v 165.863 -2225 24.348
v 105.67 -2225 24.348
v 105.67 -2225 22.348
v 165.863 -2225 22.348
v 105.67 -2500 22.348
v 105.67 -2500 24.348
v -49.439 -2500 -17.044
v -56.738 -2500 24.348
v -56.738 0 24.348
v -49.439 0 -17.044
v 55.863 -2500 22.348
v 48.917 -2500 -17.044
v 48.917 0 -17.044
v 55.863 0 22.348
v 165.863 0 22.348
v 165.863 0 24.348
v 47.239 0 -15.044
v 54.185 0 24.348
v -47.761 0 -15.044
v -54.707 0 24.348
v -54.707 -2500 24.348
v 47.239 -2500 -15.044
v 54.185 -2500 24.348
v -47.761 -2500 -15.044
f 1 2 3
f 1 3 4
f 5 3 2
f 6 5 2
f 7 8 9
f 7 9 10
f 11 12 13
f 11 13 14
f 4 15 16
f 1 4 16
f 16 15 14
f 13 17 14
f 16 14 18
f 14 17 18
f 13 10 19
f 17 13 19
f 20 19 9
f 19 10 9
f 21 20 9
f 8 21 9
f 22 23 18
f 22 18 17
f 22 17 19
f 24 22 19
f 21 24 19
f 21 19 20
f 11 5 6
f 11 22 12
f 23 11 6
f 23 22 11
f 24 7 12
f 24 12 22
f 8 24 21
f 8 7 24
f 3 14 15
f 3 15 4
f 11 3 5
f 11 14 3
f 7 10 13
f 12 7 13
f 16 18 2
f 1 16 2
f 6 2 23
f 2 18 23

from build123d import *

# Parameters (mm, degrees)
F1_DEPTH = 2500
F2_DEPTH = 50
F3_W     = 60.1930970593
F3_H     = 2
F4_DEPTH = 275


with BuildPart() as f1:
    # F0 (on Front) → F1 (new body)
    with BuildSketch(Plane.XZ):
        Polygon((-47.7612030406, -15.0440340683), (-54.7071301473, 24.3482760522), (-56.7379833711, 24.3482760522), (-49.439402303, -17.0440340683), (48.9169962217, -17.0440340683), (55.8629233284, 22.3482760522), (115.8629233284, 22.3482760522), (115.8629233284, 24.3482760522), (54.1847240661, 24.3482760522), (47.2387969594, -15.0440340683), align=None)
    extrude(amount=F1_DEPTH)

    # F2 (add): a face of the model
    f2_faces = [f1.faces().sort_by_distance(p)[0] for p in [
        (115.8629233284, -1250, 23.3482760522),
    ]]
    extrude(f2_faces, amount=F2_DEPTH)

    # F3 (on face) → F4 (cut)
    with BuildSketch(Plane.XZ.offset(2500)):
        with Locations((135.7663747988, 23.3482760522)):
            Rectangle(F3_W, F3_H)
    extrude(amount=-F4_DEPTH, mode=Mode.SUBTRACT)


solid = f1.part
